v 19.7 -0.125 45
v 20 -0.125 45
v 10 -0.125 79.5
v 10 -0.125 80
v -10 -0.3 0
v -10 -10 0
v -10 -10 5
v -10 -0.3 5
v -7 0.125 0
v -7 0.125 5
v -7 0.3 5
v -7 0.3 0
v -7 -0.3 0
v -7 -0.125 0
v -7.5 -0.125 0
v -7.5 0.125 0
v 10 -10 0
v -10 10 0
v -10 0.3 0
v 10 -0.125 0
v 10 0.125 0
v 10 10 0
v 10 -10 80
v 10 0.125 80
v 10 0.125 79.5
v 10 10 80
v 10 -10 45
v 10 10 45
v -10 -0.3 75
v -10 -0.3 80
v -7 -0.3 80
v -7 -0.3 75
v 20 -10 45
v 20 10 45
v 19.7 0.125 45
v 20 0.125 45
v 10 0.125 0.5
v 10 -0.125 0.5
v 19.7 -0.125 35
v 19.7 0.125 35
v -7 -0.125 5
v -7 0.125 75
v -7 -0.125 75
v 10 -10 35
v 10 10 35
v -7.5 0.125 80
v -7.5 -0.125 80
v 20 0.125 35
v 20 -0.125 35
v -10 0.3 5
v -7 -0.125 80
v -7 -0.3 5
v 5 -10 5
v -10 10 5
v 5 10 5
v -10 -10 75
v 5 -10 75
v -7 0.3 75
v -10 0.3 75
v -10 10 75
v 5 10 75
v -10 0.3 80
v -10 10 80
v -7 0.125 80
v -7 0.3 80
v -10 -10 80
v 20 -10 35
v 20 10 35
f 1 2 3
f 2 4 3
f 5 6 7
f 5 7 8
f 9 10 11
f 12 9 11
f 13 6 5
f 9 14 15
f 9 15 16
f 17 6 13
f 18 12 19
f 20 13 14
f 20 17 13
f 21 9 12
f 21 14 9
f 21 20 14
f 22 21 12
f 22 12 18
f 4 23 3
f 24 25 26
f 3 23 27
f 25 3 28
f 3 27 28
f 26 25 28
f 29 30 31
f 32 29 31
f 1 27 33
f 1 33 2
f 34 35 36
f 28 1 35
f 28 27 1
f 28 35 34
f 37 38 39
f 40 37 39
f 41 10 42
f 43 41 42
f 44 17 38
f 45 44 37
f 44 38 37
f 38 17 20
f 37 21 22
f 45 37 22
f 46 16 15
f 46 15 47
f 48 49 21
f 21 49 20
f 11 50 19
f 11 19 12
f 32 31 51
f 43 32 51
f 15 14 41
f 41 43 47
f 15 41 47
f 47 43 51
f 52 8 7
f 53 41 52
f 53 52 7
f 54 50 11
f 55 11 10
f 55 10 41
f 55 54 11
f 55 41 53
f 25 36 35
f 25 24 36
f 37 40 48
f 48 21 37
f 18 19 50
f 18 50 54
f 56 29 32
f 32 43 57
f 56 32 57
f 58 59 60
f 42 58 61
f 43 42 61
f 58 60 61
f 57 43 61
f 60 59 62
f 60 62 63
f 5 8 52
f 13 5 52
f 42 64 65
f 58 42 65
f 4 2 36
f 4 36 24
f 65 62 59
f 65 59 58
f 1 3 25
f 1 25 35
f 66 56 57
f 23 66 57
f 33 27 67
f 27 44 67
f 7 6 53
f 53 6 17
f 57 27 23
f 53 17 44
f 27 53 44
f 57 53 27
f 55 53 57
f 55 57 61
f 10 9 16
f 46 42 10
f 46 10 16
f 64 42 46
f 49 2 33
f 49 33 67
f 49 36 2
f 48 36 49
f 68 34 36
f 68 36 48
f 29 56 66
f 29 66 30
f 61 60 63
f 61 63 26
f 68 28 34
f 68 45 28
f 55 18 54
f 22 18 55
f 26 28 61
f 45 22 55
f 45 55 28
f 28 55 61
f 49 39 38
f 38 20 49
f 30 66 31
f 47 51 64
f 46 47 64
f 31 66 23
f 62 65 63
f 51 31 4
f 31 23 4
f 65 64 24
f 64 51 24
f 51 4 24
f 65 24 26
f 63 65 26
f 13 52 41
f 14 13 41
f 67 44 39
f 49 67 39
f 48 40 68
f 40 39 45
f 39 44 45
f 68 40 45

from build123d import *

# Parameters (mm, degrees)
ESQUISSE1_W             = 20
ESQUISSE1_H             = 20
BOSS_EXTRU_1_DEPTH      = 5
ESQUISSE2_W             = 5
ESQUISSE2_H             = 20
BOSS_EXTRU_2_DEPTH      = 70
ESQUISSE3_W             = 20
ESQUISSE3_H             = 20
BOSS_EXTRU_3_DEPTH      = 5
ESQUISSE4_W             = 3
ESQUISSE4_H             = 0.6
ENL_V_MAT_EXTRU_1_DEPTH = 90
ESQUISSE5_W             = 80
ESQUISSE5_H             = 0.25
BOSS_EXTRU_4_DEPTH      = 0.5
ESQUISSE8_W             = 10
ESQUISSE8_H             = 20
BOSS_EXTRU_6_DEPTH      = 10
BOSS_EXTRU_8_DEPTH      = 0.125
BOSS_EXTRU_8_DEPTH_BACK = 0.125


with BuildPart() as part:
    # Esquisse1 → Boss.-Extru.1 (new body)
    with BuildSketch(Plane.XY):
        Rectangle(ESQUISSE1_W, ESQUISSE1_H)
    extrude(amount=BOSS_EXTRU_1_DEPTH)

    # Esquisse2 → Boss.-Extru.2 (add)
    with BuildSketch(Plane.XY.offset(5)):
        with Locations((7.5, 0)):
            Rectangle(ESQUISSE2_W, ESQUISSE2_H)
    extrude(amount=BOSS_EXTRU_2_DEPTH)

    # Esquisse3 → Boss.-Extru.3 (add)
    with BuildSketch(Plane.XY.offset(75)):
        Rectangle(ESQUISSE3_W, ESQUISSE3_H)
    extrude(amount=BOSS_EXTRU_3_DEPTH)

    # Esquisse4 → Enlèv. mat.-Extru.1 (cut)
    with BuildSketch(Plane.XY.offset(80)):
        with Locations((-8.5, 0)):
            Rectangle(ESQUISSE4_W, ESQUISSE4_H)
    extrude(amount=-ENL_V_MAT_EXTRU_1_DEPTH, mode=Mode.SUBTRACT)

    # Esquisse5 → Boss.-Extru.4 (add)
    with BuildSketch(Plane.ZY.offset(7)):
        with Locations((40, 0)):
            Rectangle(ESQUISSE5_W, ESQUISSE5_H)
    extrude(amount=BOSS_EXTRU_4_DEPTH)

    # Esquisse8 → Boss.-Extru.6 (add)
    with BuildSketch(Plane(origin=(10, 0, 0), x_dir=(0, 0, -1), z_dir=(1, 0, 0))):
        with Locations((-40, 0)):
            Rectangle(ESQUISSE8_W, ESQUISSE8_H)
    extrude(amount=BOSS_EXTRU_6_DEPTH)

    # Esquisse10 → Boss.-Extru.8 (add, two sides: drawn at the far end of the back side and taken through both)
    with BuildSketch(Plane(origin=(0, 0, 0), x_dir=(1, 0, 0), z_dir=(0, 1, 0)).offset(-BOSS_EXTRU_8_DEPTH_BACK)):
        Polygon((10, -79.5), (19.7, -45), (20, -45), (10, -80), align=None)
        Polygon((19.7, -35), (20, -35), (10, 0), (10, -0.5), align=None)
    extrude(amount=BOSS_EXTRU_8_DEPTH + BOSS_EXTRU_8_DEPTH_BACK)


solid = part.part
